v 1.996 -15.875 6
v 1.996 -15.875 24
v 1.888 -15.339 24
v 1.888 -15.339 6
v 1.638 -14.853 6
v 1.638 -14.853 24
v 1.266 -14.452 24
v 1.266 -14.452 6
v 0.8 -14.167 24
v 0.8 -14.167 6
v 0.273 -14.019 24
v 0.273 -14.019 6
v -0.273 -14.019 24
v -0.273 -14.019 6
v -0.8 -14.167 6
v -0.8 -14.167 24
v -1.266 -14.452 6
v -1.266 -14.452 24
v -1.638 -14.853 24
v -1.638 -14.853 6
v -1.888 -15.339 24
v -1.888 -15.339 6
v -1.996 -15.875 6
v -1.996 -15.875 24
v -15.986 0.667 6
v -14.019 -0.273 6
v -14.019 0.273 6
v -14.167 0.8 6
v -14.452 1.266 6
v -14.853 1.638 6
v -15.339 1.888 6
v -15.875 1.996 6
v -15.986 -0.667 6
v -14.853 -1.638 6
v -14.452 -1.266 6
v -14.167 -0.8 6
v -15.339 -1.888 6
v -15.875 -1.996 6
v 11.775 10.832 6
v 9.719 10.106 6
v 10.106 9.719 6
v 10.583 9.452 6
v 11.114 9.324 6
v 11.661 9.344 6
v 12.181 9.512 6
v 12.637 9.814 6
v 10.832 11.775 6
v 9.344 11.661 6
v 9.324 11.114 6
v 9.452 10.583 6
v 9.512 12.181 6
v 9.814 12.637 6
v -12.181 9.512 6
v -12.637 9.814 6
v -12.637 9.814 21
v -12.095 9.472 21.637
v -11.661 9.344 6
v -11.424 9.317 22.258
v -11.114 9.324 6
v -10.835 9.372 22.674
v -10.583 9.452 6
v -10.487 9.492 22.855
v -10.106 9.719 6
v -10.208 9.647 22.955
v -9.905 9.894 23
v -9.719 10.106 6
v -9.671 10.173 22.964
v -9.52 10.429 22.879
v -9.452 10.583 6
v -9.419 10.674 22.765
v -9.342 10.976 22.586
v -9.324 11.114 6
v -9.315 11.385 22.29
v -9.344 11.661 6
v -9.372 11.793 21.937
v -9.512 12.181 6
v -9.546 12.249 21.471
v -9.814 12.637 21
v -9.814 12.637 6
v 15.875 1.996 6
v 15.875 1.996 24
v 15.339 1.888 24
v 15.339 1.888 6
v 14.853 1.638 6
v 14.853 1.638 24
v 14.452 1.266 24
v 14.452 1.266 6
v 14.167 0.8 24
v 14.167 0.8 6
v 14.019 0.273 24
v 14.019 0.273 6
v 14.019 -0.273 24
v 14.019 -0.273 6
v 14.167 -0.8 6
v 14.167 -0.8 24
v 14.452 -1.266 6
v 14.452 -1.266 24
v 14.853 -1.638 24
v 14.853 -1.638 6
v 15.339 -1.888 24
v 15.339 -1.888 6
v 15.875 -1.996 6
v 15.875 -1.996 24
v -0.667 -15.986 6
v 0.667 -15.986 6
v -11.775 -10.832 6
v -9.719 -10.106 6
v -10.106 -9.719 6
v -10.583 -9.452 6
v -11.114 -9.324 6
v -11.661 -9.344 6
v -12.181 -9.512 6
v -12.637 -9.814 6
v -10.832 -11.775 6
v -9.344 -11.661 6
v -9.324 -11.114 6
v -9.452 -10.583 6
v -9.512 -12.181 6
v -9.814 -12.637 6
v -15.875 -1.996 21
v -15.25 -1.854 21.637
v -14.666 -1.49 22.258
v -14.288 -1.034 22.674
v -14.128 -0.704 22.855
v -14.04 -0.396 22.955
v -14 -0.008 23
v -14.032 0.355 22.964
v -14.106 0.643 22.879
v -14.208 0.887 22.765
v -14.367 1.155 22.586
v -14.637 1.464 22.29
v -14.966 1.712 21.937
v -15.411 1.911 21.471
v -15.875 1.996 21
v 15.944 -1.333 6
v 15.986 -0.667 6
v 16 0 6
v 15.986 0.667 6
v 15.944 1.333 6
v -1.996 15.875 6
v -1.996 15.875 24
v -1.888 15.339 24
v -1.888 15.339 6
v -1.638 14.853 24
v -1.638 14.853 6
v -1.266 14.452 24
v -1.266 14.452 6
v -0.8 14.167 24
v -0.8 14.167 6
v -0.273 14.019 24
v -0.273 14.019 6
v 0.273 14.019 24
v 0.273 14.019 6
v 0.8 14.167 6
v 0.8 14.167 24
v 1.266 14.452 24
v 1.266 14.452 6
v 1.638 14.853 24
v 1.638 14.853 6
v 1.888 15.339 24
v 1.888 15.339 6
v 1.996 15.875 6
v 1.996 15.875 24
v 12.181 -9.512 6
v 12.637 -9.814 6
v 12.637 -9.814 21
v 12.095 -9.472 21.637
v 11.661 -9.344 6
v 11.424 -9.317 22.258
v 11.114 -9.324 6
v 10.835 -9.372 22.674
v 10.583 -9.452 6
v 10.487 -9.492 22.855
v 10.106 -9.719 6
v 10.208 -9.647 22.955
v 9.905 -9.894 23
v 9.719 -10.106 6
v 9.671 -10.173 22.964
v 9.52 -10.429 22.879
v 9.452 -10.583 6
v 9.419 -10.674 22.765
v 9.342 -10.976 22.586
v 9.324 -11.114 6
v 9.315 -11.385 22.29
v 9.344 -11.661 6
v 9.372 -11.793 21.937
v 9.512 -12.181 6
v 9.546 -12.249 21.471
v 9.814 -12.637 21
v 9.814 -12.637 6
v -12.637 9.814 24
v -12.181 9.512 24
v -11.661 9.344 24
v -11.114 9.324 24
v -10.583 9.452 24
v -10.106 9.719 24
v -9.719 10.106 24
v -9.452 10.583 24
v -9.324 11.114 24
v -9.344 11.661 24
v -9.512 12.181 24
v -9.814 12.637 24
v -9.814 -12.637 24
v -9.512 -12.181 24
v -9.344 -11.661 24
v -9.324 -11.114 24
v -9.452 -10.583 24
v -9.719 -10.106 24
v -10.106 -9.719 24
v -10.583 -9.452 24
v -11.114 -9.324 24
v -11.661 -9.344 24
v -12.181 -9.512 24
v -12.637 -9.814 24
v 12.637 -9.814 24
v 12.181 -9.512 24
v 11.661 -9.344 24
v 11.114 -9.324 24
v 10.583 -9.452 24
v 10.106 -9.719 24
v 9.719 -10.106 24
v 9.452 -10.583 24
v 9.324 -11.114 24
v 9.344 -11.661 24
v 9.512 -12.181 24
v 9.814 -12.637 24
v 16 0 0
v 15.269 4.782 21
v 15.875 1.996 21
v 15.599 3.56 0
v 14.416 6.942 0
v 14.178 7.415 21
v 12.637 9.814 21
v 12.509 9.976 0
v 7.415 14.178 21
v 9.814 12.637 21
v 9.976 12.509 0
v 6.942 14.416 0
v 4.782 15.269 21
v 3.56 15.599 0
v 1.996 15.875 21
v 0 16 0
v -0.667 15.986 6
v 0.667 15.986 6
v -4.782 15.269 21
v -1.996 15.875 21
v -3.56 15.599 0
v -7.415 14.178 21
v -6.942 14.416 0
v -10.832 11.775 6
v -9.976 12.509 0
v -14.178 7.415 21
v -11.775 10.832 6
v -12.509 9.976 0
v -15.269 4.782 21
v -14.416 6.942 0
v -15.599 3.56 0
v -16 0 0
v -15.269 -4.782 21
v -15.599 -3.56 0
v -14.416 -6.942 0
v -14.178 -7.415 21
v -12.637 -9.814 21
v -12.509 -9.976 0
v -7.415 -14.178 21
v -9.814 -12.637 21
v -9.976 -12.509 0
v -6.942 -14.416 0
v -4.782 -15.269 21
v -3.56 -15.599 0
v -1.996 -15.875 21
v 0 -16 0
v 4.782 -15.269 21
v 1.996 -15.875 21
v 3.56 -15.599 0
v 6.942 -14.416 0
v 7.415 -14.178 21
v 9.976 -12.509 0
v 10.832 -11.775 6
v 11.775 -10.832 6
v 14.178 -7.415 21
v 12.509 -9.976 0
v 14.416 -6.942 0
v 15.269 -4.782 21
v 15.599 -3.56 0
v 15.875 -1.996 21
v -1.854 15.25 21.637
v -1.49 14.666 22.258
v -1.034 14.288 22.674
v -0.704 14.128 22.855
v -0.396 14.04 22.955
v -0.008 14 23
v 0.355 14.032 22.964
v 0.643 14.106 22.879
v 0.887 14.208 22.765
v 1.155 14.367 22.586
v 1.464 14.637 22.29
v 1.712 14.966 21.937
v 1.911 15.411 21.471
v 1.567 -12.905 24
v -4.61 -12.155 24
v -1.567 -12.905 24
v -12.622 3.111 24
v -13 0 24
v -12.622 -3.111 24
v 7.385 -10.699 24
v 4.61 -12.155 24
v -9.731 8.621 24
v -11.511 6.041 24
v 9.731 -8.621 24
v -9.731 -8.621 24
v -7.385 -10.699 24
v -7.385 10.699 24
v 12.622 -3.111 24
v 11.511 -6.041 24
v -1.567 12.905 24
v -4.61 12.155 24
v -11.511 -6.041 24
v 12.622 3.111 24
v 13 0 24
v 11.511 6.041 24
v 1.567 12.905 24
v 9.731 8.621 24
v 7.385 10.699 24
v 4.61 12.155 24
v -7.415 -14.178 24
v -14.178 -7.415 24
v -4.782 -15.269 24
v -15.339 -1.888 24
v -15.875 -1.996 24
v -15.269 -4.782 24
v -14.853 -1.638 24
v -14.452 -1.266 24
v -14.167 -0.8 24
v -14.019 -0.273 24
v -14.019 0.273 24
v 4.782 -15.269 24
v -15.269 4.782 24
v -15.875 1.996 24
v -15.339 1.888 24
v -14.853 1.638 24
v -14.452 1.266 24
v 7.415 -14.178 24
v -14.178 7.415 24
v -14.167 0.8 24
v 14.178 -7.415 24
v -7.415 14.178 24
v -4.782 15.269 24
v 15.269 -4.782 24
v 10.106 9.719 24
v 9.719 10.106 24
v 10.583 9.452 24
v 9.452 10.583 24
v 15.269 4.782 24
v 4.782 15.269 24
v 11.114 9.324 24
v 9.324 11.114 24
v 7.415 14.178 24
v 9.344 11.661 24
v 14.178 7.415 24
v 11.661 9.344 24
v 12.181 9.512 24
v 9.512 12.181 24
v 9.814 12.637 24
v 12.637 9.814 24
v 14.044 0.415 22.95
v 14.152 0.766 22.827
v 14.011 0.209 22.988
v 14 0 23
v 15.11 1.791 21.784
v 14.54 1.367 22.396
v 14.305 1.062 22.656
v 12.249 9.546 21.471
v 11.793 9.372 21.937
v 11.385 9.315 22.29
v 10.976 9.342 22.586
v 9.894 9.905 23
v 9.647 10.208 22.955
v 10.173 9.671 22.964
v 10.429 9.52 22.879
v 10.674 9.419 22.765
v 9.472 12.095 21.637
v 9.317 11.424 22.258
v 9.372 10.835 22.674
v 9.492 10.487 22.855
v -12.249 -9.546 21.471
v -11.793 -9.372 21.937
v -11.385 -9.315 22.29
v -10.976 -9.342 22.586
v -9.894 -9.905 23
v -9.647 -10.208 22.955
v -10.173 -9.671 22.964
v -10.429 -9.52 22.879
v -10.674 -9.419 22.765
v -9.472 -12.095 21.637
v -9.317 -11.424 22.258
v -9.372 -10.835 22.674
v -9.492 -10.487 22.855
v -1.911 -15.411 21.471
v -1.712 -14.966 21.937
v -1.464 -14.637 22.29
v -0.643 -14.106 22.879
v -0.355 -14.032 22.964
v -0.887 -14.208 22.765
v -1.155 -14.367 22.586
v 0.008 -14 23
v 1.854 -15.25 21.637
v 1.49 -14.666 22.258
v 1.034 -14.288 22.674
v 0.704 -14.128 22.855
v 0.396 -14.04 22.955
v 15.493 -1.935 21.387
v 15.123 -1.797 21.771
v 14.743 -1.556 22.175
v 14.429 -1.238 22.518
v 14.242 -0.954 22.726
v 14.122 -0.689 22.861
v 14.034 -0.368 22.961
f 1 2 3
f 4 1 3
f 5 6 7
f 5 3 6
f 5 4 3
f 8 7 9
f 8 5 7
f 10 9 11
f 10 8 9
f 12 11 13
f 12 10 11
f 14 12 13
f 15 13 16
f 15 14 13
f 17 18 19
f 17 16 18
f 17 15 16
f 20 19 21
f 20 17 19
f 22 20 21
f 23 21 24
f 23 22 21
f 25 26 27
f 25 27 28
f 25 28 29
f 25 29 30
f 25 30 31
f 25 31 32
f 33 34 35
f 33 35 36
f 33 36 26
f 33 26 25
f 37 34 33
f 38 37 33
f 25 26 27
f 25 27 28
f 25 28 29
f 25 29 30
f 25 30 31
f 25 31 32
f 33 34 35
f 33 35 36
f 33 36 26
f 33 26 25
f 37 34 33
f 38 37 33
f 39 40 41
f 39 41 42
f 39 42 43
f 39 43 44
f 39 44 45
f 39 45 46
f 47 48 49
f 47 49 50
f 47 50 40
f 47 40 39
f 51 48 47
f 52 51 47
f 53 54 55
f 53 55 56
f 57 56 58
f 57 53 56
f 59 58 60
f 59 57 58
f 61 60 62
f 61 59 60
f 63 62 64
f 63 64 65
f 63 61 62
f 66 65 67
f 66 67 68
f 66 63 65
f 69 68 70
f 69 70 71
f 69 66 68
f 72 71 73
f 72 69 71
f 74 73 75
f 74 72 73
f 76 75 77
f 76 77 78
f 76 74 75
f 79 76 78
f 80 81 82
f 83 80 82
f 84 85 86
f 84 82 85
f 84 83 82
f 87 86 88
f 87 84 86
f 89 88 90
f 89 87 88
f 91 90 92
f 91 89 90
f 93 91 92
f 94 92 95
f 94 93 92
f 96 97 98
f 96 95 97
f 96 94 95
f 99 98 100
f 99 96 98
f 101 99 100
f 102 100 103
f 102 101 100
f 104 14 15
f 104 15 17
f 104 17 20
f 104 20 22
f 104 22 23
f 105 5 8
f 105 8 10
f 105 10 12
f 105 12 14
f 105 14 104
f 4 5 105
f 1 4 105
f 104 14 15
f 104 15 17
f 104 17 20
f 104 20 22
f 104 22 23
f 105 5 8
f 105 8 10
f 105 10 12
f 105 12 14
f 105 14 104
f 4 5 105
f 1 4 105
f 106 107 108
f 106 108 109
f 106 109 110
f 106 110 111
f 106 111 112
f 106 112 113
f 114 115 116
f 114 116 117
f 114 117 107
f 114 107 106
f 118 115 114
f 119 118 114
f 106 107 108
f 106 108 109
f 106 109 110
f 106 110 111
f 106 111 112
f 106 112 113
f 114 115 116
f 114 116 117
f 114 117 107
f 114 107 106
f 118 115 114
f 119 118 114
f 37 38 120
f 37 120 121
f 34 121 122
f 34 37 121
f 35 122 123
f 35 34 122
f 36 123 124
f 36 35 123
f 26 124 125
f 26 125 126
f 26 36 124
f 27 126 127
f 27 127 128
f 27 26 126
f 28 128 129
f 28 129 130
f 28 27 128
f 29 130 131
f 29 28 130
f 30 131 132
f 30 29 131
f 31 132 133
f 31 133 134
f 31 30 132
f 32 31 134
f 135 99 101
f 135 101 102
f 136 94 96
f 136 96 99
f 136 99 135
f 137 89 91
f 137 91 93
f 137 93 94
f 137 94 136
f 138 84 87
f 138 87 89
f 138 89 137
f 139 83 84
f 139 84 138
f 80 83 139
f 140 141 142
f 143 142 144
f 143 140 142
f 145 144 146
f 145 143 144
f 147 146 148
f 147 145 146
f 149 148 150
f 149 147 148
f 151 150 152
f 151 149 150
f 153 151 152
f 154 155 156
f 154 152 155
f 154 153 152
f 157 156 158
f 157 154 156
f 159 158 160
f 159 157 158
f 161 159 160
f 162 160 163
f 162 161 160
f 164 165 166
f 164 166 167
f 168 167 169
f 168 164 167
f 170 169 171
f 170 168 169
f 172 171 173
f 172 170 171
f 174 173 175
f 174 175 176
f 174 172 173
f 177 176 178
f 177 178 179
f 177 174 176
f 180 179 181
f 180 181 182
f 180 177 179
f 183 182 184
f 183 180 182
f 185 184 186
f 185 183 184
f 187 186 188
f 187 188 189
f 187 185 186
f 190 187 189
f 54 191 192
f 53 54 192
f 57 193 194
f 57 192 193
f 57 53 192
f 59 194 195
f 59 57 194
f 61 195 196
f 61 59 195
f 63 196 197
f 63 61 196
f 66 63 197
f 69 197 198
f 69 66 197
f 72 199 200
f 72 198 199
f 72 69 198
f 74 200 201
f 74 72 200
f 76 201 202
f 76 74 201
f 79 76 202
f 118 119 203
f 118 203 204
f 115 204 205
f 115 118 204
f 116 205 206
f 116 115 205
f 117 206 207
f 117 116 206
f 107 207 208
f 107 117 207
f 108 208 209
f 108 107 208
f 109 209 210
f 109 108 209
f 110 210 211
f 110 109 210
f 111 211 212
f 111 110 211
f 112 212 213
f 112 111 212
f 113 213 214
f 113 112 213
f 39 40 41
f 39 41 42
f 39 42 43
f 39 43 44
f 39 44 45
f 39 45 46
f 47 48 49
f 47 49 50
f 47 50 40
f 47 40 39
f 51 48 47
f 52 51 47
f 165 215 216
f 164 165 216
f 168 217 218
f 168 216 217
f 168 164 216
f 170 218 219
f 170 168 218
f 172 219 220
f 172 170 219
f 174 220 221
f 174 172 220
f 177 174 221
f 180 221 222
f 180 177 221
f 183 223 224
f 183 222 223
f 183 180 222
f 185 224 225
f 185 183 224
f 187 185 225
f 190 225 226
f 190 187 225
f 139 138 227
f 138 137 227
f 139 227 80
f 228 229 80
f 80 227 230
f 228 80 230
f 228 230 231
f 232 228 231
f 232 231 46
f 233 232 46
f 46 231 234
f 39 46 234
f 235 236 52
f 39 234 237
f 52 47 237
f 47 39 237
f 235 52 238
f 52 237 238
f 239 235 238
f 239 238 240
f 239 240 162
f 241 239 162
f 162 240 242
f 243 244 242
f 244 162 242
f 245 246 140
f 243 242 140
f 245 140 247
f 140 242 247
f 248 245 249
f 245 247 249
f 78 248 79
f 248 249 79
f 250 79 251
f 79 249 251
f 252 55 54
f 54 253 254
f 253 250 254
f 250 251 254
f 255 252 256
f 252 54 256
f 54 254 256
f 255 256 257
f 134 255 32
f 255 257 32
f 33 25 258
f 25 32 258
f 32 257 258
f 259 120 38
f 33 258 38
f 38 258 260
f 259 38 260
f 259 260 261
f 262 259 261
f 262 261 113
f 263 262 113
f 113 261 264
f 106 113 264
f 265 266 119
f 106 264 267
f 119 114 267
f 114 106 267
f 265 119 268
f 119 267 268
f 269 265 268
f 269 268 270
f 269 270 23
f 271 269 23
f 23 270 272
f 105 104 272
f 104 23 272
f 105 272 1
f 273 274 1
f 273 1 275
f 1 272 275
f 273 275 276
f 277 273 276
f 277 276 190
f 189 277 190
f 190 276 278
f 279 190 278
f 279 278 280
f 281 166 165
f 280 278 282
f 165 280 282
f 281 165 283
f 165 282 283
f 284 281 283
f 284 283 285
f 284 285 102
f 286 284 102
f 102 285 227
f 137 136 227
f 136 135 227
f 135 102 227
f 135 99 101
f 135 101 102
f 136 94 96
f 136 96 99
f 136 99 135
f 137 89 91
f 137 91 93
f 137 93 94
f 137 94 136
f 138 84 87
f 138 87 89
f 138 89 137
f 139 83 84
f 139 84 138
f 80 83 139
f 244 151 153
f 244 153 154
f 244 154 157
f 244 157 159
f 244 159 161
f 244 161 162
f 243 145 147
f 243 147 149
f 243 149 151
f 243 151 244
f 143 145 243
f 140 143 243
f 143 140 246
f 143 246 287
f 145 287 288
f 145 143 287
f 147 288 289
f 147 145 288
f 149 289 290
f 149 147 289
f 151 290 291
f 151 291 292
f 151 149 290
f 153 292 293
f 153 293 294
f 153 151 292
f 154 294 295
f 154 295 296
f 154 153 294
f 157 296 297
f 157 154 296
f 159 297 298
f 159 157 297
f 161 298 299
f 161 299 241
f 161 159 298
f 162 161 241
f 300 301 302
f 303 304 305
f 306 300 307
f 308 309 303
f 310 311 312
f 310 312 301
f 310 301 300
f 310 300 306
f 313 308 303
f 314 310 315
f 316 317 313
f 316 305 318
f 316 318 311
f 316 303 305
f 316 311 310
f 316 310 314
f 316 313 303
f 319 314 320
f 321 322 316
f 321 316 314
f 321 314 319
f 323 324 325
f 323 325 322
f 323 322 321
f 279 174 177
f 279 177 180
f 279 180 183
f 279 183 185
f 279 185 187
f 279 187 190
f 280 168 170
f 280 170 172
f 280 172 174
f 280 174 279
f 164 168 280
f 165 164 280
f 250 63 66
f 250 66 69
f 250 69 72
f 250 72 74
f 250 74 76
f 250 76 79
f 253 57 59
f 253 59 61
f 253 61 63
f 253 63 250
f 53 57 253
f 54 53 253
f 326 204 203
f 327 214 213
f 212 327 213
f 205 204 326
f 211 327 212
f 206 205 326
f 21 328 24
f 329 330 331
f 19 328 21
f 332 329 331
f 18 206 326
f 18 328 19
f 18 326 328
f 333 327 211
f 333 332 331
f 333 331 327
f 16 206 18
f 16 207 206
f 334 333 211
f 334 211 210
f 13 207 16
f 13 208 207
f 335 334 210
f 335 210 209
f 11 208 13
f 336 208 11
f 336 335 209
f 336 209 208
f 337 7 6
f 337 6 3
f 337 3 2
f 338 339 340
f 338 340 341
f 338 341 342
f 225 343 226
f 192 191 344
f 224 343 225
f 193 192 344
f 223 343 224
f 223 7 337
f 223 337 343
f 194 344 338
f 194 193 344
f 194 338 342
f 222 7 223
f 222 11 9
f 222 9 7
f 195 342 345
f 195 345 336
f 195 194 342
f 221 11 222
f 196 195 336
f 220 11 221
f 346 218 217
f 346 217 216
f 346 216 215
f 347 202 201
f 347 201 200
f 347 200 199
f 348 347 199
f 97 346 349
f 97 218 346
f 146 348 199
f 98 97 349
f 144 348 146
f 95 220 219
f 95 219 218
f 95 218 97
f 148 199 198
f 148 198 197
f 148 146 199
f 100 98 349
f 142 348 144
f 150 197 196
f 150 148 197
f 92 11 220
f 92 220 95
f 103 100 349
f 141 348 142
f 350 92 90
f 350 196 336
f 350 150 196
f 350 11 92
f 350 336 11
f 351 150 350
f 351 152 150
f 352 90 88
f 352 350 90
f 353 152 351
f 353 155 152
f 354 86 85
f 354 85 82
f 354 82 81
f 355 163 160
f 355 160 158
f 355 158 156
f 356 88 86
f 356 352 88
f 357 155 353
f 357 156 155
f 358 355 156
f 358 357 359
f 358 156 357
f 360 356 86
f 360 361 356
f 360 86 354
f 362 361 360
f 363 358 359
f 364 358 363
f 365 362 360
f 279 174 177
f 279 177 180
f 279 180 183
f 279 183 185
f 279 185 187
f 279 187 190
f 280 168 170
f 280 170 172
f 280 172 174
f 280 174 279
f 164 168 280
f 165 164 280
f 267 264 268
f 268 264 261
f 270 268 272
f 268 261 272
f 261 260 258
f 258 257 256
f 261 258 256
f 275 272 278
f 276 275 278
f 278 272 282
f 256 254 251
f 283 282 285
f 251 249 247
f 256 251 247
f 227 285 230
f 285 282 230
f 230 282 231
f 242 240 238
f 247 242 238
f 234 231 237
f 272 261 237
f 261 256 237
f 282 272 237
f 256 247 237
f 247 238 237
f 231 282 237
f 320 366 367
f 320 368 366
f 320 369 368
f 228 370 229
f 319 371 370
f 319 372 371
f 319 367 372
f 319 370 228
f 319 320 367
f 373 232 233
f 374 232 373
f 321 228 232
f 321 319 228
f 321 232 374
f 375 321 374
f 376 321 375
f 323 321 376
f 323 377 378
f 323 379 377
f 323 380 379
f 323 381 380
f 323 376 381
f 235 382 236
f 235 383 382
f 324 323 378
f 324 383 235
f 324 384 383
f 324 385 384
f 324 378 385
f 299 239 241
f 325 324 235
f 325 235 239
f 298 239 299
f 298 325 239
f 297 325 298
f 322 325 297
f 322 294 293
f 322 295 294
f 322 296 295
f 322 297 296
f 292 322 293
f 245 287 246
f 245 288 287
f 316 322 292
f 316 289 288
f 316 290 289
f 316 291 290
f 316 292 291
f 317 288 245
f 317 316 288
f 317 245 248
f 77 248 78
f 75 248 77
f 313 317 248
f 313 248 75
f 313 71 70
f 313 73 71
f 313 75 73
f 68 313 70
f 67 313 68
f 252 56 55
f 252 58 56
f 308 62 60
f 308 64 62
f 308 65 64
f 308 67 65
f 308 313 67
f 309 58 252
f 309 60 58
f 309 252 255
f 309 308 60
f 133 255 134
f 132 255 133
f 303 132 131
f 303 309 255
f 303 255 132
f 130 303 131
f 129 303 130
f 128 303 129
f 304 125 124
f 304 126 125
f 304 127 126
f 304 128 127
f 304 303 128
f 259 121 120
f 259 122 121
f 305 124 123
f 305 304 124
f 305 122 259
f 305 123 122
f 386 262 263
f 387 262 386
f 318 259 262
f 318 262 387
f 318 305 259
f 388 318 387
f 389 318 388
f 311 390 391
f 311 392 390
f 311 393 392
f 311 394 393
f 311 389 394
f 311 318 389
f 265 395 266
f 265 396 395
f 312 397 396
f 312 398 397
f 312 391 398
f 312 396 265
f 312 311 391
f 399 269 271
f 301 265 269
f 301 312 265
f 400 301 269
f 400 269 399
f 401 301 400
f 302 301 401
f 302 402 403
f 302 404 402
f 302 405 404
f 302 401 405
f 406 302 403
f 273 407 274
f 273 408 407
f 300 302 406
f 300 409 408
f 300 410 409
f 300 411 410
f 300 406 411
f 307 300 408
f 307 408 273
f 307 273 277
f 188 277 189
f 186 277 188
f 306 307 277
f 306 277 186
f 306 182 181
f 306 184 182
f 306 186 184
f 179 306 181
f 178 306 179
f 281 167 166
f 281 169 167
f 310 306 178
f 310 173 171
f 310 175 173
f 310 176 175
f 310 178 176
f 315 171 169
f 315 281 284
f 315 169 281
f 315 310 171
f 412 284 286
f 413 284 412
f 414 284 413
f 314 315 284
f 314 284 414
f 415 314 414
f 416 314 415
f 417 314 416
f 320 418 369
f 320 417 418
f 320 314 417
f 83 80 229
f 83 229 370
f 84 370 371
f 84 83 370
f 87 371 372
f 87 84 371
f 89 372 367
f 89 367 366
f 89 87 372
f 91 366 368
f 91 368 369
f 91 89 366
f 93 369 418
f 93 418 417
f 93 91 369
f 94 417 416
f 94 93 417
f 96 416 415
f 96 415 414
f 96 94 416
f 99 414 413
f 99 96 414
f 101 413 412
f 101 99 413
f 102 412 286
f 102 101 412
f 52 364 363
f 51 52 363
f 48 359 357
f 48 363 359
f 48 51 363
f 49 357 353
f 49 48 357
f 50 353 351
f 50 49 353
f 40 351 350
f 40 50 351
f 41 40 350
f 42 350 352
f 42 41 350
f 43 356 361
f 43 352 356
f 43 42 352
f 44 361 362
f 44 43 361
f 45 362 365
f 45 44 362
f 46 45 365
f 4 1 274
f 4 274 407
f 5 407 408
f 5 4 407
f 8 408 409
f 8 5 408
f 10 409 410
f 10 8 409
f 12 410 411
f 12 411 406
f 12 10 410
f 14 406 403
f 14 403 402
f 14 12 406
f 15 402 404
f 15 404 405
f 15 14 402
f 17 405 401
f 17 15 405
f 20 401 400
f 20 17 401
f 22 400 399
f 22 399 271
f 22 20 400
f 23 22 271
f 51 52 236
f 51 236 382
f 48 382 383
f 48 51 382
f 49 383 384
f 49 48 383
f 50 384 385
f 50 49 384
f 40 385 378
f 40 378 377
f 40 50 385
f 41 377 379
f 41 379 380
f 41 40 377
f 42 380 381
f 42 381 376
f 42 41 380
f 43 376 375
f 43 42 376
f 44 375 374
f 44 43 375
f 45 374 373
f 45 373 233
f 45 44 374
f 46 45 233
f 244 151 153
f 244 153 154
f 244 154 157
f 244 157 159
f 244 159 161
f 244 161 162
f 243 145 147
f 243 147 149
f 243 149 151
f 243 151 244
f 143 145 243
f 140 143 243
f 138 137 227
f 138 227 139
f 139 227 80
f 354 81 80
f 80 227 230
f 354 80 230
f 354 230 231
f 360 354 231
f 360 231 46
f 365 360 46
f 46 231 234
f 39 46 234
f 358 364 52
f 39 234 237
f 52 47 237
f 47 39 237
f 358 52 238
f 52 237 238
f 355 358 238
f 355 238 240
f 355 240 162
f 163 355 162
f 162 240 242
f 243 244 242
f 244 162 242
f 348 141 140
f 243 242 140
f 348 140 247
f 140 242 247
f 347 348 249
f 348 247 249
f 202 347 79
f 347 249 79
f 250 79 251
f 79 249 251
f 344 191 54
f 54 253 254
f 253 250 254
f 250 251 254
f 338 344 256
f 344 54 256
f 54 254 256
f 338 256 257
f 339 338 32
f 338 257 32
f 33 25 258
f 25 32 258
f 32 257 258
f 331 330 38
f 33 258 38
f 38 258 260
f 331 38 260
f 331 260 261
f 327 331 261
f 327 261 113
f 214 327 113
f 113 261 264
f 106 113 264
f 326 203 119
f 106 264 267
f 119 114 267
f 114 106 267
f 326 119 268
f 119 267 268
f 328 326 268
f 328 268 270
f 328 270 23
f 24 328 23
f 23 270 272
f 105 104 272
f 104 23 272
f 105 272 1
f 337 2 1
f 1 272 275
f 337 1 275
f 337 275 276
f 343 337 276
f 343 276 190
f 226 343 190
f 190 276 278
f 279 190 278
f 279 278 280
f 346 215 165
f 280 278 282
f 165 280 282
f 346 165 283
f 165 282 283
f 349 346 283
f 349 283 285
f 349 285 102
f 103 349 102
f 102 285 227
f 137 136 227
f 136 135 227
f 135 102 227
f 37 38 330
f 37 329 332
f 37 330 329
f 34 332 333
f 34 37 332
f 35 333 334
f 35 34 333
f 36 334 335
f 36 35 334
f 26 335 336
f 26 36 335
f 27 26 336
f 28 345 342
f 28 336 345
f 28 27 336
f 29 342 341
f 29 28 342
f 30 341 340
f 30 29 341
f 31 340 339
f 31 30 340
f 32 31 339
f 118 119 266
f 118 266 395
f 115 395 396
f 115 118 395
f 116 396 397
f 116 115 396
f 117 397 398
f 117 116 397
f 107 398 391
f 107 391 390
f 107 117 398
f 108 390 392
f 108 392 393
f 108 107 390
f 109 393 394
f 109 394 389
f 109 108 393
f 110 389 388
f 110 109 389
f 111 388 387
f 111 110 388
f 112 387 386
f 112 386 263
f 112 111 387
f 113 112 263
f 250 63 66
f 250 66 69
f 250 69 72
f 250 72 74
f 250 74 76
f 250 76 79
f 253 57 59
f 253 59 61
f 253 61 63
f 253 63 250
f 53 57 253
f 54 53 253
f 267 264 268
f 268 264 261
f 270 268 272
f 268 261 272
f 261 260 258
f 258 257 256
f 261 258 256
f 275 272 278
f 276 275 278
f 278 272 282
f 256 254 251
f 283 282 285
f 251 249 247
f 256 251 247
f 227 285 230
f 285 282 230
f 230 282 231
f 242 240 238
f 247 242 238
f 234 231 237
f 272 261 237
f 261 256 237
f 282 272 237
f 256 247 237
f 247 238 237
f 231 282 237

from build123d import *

# Parameters (mm, degrees)
CYLINDER001_R     = 2
CYLINDER001_DEPTH = 21
ARRAY_COUNT       = 8
CYLINDER_R        = 16
CYLINDER_DEPTH    = 24
CHAMFER_SIZE      = 3


with BuildPart() as array:
    # Cylinder001 → Cylinder001 (new body)
    with BuildSketch(Plane(origin=(16, 0, 6), x_dir=(1, 0, 0), z_dir=(0, 0, 1))):
        Circle(CYLINDER001_R)
    extrude(amount=CYLINDER001_DEPTH)

    # Array: Array ×8 about axis
    array_axis = Axis((0, 0, 1), (0, 0, 1))


with BuildPart() as array_1:
    add(array.part)
    for i in range(1, ARRAY_COUNT):
        add(array.part.rotate(array_axis, i * 360 / ARRAY_COUNT))


with BuildPart() as cilindre:
    # Cylinder → Cylinder (new body)
    with BuildSketch(Plane.XY):
        Circle(CYLINDER_R)
    extrude(amount=CYLINDER_DEPTH)


with BuildPart() as cut:
    # Cut base: copy of Cilindre
    add(cilindre.part)

    # Cut: cut Array
    add(array_1.part, mode=Mode.SUBTRACT)


with BuildPart() as cut001:
    # Chamfer base: copy of Cilindre
    add(cilindre.part)

    # Chamfer
    chamfer_edges = [cut001.edges().sort_by_distance(p)[0] for p in [
        (-16, 0, 24),
    ]]
    chamfer(chamfer_edges, length=CHAMFER_SIZE)

    # Cut001: cut Array
    add(array_1.part, mode=Mode.SUBTRACT)


solid = Compound([cut.part, cut001.part])
